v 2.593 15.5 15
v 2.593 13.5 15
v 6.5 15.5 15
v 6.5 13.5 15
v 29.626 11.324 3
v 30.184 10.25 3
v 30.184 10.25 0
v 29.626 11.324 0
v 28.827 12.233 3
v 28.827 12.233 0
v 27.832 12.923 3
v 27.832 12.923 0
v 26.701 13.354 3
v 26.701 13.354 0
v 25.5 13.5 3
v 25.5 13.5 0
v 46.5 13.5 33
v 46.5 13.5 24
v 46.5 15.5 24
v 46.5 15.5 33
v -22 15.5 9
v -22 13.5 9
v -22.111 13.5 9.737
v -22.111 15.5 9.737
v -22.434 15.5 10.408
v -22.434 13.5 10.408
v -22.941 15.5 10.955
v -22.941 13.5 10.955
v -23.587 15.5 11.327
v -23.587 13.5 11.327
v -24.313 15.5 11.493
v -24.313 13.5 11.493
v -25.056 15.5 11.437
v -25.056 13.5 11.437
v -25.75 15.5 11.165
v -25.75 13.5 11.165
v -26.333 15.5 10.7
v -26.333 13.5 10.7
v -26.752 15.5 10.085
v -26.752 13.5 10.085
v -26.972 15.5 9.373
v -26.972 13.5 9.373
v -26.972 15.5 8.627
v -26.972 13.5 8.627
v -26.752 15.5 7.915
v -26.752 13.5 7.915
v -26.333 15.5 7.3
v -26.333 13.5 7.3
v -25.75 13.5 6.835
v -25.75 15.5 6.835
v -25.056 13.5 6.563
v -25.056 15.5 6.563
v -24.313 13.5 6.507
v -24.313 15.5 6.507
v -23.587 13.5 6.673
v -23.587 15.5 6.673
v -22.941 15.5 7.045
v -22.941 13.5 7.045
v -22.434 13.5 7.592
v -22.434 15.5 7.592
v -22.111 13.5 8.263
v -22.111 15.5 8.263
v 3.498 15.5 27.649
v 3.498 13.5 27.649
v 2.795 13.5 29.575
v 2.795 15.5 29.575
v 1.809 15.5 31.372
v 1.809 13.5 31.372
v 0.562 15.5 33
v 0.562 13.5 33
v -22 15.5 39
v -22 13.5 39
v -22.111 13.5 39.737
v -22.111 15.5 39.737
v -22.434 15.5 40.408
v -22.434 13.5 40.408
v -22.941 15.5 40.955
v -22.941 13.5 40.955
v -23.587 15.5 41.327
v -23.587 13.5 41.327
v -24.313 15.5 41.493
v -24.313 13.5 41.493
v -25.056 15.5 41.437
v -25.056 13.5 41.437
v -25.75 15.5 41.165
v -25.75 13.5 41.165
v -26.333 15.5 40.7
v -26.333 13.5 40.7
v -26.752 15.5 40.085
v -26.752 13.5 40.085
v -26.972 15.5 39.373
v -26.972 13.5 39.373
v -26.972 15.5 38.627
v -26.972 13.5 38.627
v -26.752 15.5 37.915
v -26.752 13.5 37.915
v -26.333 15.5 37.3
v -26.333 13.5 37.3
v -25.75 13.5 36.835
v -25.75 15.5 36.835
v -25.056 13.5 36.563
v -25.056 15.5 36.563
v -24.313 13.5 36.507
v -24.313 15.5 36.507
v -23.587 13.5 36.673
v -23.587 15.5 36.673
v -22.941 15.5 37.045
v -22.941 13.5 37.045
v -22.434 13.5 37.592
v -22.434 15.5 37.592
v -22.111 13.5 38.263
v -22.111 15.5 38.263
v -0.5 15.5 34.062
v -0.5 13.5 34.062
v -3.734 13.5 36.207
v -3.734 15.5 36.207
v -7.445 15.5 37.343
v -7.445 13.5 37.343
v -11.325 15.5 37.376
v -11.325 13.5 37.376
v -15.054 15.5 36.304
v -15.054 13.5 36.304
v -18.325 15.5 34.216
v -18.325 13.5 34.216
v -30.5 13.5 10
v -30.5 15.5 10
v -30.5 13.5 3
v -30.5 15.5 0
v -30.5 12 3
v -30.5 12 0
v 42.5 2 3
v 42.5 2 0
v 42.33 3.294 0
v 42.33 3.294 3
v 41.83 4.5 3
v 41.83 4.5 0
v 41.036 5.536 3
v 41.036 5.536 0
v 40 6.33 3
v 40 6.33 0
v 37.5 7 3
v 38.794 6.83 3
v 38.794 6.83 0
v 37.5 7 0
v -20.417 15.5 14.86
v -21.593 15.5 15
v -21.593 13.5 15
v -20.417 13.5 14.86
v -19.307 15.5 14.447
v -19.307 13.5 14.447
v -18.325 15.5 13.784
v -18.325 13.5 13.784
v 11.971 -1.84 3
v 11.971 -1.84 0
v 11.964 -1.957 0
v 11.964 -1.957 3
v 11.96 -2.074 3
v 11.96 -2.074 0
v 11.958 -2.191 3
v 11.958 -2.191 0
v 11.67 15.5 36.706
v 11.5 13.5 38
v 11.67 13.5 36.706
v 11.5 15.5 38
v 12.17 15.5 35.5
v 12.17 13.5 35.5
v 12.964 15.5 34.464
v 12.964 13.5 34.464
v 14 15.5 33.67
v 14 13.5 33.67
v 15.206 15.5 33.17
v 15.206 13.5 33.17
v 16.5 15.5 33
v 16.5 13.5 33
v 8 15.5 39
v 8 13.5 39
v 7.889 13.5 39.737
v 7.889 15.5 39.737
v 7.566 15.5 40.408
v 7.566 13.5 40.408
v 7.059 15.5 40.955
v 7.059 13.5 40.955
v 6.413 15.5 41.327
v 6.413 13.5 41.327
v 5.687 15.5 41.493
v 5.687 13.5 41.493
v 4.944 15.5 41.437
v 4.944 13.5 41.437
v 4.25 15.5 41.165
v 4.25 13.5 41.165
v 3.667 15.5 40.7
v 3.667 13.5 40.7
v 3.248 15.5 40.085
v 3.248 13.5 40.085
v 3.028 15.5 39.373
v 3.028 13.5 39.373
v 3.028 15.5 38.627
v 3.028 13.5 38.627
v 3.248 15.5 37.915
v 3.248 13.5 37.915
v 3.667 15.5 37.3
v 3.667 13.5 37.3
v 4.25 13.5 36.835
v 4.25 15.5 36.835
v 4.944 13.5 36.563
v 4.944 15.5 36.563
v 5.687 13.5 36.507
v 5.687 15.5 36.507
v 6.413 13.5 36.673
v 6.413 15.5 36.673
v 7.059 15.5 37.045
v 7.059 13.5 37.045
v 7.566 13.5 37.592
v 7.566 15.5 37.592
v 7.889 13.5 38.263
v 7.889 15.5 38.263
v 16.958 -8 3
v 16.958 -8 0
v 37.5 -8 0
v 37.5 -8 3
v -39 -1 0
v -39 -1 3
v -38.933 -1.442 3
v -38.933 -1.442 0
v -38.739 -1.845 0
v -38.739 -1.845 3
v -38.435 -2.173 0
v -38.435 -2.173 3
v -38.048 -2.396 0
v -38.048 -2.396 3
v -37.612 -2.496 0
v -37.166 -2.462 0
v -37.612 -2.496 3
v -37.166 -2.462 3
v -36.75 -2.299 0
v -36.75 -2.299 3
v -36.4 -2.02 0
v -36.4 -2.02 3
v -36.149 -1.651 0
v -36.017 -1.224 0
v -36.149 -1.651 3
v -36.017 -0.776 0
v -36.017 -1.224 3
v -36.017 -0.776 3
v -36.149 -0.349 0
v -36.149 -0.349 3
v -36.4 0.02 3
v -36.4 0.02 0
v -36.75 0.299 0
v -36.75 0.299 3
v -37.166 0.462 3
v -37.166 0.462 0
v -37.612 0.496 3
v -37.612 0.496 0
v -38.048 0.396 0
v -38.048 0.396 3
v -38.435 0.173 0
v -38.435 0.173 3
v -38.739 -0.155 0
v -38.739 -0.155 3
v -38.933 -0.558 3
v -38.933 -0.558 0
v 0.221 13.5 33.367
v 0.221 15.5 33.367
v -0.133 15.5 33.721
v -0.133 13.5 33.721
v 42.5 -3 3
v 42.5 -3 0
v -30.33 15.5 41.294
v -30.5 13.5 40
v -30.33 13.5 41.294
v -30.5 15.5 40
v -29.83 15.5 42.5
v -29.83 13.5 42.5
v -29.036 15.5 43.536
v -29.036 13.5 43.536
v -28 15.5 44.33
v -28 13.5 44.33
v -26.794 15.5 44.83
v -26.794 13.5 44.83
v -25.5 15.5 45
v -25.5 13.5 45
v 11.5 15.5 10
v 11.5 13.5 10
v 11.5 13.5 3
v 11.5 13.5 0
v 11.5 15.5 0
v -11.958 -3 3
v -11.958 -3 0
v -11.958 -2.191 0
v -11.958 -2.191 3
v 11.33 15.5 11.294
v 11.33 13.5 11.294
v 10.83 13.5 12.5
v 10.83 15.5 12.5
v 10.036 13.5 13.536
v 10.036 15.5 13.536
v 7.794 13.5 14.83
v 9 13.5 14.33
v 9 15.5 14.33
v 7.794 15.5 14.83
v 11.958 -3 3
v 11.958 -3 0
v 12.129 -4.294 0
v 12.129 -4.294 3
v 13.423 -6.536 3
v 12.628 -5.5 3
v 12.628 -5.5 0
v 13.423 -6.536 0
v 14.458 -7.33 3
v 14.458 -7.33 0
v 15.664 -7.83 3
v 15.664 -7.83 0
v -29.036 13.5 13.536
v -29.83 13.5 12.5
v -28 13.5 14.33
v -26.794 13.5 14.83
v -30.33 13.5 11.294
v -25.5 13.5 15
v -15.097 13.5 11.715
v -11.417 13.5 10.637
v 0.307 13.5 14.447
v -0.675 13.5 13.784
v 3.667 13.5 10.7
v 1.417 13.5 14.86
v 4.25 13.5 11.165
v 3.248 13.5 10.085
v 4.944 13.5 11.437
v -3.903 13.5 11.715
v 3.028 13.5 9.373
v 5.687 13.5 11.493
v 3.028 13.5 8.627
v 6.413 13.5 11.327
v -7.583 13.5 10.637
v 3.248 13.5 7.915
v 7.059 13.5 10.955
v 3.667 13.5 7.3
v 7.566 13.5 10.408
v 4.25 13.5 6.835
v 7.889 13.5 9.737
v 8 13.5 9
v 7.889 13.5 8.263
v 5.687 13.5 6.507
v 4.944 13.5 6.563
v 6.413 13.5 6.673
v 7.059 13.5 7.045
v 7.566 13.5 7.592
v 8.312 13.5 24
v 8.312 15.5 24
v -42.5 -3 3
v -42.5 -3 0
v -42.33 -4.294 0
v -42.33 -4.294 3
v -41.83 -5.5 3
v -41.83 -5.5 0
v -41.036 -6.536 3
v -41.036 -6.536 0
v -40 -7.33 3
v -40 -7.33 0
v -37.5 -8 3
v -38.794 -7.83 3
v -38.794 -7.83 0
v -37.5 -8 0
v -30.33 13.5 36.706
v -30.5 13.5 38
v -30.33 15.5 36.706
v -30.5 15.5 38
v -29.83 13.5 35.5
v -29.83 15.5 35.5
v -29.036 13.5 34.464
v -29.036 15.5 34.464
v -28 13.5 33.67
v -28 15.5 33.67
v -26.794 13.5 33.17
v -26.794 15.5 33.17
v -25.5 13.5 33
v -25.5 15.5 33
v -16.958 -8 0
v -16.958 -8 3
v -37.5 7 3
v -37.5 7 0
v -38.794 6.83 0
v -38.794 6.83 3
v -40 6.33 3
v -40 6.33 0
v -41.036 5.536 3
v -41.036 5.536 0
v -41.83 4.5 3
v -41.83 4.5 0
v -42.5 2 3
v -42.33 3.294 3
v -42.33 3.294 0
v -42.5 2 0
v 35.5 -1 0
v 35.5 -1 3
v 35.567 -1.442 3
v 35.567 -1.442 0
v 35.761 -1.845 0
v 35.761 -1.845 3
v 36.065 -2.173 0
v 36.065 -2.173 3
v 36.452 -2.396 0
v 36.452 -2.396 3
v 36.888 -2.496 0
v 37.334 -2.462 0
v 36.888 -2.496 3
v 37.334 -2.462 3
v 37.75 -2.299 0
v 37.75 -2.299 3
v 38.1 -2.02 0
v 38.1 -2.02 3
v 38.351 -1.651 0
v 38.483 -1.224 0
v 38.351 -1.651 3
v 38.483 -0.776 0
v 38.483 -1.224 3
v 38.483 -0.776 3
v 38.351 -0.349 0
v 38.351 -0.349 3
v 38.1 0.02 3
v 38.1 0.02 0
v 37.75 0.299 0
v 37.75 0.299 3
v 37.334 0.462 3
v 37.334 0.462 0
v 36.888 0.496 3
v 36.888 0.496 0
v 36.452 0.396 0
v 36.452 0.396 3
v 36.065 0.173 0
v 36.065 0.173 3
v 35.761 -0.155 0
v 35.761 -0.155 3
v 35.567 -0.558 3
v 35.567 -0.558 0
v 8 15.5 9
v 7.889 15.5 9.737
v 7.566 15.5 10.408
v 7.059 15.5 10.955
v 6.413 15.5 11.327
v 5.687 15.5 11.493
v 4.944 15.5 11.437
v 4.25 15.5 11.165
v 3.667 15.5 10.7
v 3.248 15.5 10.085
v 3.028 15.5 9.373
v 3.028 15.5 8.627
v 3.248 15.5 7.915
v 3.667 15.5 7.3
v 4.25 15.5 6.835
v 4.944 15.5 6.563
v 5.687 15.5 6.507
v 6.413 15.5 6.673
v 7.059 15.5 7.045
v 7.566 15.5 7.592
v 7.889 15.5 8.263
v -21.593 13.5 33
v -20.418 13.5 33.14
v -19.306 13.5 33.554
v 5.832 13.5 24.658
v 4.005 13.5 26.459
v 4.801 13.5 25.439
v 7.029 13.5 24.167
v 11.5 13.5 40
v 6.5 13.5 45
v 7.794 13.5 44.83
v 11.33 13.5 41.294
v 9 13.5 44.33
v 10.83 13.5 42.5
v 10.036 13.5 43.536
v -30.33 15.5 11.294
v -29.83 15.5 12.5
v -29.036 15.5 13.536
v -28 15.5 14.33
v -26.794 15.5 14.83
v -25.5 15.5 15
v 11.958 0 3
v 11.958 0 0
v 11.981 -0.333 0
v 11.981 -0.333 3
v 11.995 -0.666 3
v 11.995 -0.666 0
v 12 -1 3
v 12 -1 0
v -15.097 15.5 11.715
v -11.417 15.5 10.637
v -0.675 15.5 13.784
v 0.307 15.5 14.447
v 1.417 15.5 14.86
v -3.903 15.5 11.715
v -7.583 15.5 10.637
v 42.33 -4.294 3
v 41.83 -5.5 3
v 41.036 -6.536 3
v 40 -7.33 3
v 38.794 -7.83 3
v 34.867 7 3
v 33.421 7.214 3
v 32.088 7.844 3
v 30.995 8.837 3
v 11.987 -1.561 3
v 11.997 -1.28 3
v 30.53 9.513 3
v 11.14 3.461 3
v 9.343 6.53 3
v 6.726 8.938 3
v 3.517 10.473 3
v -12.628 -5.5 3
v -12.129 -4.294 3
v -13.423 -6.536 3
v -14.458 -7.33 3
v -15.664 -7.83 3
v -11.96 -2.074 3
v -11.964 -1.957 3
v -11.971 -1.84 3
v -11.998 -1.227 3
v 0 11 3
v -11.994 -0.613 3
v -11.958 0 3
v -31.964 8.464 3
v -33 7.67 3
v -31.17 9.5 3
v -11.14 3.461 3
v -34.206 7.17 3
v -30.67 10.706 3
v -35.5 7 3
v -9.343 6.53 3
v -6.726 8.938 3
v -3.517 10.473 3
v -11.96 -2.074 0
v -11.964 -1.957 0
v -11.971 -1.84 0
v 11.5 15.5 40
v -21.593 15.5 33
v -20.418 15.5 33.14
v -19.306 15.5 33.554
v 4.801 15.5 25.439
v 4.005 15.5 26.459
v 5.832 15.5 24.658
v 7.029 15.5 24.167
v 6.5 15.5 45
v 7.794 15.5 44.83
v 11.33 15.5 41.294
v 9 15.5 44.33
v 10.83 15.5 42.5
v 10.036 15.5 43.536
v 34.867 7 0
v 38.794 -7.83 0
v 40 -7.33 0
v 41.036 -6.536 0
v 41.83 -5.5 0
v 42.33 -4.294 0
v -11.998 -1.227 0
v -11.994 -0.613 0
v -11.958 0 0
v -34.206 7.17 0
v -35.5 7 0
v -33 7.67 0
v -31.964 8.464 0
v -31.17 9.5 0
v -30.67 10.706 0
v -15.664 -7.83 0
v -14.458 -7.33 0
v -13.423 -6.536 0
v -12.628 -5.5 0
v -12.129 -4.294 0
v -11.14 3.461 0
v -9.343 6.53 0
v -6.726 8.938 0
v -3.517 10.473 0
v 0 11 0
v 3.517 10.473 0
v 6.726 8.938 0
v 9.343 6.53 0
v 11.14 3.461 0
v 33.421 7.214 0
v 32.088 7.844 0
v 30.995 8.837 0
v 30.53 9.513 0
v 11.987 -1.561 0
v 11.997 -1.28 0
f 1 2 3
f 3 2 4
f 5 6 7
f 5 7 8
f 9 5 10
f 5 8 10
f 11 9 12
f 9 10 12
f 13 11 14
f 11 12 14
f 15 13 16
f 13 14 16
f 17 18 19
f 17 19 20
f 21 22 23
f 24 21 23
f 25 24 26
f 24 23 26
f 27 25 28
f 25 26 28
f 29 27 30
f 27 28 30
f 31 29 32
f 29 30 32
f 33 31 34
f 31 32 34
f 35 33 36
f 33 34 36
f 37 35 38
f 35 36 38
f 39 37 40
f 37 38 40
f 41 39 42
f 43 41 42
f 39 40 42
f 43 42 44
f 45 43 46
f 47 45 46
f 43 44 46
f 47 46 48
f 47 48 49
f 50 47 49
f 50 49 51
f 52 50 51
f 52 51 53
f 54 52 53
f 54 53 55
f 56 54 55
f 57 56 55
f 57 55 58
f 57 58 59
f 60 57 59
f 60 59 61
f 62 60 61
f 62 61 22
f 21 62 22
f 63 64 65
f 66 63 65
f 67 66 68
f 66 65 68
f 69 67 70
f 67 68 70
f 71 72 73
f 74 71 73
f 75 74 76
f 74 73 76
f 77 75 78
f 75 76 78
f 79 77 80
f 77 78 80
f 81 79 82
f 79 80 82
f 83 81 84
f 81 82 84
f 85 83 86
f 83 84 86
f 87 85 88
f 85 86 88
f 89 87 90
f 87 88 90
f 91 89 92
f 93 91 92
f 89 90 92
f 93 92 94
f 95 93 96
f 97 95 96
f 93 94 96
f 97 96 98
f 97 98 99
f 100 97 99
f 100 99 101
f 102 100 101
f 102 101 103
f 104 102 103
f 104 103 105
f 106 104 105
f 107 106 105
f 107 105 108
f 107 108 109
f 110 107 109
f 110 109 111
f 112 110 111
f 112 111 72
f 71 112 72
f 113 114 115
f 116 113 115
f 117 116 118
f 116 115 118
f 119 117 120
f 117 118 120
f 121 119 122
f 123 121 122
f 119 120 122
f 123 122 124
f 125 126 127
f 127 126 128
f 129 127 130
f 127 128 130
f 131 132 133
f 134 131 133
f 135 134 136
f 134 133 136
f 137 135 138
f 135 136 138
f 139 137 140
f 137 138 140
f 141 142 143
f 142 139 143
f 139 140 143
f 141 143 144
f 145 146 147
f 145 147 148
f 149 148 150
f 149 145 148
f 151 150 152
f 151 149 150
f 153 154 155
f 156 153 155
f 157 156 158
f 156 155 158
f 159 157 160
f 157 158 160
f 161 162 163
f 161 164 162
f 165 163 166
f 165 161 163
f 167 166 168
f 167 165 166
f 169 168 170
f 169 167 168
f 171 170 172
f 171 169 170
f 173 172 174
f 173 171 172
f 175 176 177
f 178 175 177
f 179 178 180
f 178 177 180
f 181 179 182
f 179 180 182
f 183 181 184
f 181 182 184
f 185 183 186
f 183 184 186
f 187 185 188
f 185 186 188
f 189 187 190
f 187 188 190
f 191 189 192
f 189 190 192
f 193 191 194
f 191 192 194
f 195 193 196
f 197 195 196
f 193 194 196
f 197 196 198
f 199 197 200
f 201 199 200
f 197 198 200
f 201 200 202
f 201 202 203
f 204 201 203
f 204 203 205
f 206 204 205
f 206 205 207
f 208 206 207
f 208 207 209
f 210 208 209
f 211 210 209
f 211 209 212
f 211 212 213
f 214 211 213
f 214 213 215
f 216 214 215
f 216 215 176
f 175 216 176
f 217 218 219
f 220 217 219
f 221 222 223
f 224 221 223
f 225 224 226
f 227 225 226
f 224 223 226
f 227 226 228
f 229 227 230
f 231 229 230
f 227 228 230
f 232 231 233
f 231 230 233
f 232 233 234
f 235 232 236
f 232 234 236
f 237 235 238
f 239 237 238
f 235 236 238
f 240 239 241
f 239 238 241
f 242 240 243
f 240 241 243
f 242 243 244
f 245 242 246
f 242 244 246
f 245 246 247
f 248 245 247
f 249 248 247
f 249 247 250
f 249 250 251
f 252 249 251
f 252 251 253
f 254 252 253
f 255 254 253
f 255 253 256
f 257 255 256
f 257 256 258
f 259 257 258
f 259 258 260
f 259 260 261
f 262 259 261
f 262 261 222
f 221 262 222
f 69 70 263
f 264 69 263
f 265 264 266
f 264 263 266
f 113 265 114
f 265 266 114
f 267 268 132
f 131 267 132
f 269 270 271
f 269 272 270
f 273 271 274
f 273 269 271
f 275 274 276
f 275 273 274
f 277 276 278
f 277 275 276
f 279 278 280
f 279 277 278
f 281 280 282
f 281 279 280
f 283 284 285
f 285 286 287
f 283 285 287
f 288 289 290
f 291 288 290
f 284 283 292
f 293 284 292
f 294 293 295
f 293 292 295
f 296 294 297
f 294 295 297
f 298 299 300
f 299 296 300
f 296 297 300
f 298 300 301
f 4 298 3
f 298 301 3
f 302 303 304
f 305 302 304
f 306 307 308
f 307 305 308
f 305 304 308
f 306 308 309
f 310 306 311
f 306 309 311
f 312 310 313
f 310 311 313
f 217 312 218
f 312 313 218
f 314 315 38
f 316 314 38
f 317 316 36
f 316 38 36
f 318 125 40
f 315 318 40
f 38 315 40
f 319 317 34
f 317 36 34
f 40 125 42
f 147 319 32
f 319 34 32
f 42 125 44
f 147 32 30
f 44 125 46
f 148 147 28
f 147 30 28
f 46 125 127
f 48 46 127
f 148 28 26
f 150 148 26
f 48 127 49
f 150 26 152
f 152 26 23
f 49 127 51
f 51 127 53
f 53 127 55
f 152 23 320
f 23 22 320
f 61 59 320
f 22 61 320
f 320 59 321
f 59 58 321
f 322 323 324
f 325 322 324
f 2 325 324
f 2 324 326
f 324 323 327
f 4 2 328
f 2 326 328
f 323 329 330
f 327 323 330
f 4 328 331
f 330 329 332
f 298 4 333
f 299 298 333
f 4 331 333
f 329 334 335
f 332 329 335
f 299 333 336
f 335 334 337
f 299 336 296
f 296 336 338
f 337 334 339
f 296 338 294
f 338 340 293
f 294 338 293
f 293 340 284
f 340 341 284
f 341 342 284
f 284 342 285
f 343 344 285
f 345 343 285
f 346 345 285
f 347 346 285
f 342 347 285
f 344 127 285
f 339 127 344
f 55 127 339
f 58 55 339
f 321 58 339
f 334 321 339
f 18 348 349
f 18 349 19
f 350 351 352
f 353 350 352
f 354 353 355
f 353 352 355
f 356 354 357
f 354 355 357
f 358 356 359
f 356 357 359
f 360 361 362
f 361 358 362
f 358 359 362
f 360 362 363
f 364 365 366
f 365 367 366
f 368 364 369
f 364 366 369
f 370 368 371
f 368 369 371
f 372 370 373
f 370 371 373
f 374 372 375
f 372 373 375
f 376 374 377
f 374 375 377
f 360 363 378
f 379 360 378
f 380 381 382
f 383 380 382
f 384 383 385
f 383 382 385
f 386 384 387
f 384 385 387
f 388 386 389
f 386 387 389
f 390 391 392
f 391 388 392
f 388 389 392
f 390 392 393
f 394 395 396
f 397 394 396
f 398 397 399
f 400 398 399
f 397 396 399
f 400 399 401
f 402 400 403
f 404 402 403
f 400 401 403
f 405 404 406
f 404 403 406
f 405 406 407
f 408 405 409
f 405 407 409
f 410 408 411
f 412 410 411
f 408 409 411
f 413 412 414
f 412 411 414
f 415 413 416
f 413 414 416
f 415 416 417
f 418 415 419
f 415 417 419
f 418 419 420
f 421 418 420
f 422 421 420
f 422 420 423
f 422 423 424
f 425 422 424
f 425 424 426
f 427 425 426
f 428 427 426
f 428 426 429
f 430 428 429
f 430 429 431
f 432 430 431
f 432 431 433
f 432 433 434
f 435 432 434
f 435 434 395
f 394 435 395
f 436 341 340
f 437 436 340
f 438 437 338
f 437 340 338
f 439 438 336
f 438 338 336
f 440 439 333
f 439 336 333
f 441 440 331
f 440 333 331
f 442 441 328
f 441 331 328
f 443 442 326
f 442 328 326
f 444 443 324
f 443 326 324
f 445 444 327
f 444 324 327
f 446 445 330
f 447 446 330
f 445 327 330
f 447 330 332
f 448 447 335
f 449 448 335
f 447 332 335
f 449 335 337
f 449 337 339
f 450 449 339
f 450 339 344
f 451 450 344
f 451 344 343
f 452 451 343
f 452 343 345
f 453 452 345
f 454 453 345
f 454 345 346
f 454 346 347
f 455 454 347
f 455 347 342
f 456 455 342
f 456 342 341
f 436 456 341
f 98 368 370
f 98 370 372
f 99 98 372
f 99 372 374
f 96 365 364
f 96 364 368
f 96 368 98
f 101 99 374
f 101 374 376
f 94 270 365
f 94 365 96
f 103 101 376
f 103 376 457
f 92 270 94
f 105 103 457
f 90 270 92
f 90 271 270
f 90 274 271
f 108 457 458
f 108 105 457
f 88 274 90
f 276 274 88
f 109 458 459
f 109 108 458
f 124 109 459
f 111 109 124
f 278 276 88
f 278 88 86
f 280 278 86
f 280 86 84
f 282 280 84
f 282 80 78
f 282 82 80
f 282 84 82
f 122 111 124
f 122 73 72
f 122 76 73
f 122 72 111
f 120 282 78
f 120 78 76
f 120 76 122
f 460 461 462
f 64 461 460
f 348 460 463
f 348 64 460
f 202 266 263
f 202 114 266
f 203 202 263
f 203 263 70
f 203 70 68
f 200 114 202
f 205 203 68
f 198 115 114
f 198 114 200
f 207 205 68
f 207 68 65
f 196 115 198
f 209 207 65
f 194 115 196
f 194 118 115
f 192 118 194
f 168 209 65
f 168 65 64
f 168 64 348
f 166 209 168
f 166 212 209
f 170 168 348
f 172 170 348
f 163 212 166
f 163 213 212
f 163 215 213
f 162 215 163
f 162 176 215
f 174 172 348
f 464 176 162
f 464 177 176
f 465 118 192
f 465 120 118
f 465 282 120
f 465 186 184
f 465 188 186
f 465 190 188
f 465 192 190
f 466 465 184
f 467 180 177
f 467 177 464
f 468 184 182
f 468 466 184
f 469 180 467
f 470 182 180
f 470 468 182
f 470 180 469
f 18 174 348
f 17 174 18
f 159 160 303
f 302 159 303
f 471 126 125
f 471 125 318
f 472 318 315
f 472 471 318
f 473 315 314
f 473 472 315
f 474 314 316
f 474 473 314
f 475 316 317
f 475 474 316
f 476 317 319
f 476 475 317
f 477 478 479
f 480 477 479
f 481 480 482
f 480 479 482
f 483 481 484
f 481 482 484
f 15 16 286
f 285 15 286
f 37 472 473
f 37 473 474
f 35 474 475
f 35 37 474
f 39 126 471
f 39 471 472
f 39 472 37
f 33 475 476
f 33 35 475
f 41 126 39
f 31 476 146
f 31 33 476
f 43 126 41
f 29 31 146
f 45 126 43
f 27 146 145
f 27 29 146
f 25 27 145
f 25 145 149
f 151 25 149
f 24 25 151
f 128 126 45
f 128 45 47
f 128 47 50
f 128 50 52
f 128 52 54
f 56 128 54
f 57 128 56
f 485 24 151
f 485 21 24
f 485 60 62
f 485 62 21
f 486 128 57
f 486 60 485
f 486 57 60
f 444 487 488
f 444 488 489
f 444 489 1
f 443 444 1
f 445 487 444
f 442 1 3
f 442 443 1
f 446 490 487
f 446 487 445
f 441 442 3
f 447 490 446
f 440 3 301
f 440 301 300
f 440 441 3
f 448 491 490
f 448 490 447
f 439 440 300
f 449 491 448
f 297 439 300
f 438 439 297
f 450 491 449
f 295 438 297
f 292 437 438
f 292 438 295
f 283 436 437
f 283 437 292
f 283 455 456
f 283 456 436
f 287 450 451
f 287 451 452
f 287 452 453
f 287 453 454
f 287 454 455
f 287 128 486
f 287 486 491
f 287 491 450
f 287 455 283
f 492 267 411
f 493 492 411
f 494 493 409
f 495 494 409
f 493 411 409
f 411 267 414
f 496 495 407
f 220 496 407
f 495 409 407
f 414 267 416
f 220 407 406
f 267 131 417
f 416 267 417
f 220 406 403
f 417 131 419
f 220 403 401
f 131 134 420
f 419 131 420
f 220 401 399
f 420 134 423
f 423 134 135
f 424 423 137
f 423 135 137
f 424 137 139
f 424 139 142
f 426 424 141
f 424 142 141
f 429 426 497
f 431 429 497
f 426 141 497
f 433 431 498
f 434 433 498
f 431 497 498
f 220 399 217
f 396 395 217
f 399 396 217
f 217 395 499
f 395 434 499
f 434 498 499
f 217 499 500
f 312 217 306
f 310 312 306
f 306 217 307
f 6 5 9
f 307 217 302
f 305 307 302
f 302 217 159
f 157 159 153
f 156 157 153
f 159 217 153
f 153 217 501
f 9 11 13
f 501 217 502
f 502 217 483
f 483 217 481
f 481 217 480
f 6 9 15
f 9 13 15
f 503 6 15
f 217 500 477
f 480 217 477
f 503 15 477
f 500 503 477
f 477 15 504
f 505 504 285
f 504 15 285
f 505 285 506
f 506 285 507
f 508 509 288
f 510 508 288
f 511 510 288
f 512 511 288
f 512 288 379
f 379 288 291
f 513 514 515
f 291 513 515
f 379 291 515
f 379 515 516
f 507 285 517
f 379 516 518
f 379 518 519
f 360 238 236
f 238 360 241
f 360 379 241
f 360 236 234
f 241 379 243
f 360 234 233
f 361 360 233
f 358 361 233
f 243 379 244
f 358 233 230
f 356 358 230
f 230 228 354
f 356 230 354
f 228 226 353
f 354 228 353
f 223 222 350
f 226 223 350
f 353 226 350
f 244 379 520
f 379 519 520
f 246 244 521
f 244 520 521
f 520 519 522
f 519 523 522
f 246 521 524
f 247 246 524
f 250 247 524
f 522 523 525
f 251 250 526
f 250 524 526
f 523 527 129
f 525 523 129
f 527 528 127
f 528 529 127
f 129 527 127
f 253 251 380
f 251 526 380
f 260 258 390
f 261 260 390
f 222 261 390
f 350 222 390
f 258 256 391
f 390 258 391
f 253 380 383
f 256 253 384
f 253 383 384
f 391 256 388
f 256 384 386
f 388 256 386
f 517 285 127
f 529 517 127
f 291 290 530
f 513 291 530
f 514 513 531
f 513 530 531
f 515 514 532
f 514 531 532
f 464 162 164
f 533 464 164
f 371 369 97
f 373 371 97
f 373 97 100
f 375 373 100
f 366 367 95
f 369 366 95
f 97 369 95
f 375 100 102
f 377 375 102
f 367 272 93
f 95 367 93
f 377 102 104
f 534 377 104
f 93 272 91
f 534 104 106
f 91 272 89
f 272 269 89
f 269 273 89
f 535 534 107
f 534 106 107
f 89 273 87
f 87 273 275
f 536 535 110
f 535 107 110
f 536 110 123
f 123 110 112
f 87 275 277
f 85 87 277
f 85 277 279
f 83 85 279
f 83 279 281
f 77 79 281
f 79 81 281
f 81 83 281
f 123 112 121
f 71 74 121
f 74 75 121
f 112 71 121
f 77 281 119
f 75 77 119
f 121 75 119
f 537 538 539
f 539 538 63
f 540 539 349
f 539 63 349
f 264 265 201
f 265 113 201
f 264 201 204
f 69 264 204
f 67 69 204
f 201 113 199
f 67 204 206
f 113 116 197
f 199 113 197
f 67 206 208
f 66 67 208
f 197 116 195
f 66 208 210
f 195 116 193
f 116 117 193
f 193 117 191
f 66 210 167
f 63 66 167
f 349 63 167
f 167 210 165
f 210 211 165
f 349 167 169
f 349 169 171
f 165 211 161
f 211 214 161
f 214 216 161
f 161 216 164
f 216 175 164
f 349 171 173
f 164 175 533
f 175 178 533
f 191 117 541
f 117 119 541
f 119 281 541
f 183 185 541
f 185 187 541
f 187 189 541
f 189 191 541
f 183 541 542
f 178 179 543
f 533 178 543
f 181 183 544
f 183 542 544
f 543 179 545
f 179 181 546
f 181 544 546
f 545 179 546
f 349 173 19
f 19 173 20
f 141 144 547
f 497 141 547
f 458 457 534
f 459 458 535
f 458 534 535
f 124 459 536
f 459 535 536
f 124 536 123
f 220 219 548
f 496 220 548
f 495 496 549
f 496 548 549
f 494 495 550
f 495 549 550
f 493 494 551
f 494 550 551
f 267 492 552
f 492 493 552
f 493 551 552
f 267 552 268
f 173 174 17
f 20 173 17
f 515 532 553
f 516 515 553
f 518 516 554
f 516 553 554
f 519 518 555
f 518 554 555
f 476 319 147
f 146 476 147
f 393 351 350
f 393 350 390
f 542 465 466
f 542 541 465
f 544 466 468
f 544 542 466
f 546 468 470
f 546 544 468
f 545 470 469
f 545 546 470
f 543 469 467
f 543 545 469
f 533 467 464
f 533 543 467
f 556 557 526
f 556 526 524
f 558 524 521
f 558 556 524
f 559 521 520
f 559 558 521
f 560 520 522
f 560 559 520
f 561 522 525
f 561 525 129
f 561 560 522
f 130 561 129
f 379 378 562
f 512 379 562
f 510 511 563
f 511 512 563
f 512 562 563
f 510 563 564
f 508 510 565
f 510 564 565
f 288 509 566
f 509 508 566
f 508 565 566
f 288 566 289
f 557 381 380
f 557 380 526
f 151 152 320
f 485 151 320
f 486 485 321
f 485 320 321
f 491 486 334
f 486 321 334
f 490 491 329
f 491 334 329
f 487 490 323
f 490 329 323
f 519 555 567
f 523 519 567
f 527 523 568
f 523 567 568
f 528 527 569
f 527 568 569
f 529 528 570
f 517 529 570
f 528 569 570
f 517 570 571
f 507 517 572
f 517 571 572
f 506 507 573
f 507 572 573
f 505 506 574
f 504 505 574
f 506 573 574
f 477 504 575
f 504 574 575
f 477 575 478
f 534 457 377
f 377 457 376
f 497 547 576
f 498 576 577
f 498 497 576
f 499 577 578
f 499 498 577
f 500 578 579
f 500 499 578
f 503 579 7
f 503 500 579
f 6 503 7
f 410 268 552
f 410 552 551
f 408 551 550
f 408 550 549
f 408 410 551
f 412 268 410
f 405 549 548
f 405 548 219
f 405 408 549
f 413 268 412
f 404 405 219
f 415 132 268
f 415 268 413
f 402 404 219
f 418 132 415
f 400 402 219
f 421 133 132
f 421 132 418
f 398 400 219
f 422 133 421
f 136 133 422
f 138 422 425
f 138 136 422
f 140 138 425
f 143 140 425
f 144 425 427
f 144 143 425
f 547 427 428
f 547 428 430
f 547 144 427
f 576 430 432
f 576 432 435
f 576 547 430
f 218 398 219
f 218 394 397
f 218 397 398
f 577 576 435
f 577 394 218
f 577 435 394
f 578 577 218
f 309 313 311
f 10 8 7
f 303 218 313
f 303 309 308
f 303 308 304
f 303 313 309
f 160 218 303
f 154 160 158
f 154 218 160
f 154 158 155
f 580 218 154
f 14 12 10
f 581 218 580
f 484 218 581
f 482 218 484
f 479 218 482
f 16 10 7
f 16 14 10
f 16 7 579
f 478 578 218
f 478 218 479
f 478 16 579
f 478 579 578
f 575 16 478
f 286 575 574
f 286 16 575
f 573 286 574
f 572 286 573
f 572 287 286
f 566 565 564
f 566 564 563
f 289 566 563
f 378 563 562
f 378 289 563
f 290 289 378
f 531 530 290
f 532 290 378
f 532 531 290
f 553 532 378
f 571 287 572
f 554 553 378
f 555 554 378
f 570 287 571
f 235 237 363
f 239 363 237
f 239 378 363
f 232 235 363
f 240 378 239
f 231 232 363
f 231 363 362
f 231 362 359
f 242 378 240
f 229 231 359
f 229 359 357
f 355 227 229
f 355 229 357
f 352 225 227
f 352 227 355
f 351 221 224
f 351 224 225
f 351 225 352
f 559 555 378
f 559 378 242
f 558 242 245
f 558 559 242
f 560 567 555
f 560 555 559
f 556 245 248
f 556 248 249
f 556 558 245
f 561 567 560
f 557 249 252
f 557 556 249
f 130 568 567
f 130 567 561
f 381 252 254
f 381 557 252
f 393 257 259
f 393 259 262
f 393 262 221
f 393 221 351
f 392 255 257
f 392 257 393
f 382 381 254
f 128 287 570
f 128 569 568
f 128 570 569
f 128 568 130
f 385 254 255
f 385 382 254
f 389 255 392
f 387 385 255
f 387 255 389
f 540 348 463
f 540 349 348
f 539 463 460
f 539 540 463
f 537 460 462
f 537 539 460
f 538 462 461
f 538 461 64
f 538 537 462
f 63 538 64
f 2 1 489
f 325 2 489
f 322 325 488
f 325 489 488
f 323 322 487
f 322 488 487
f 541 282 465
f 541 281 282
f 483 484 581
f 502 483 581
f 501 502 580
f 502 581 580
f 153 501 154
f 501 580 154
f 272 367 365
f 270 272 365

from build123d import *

# Parameters (mm, degrees)
F0_W        = 12
F0_H        = 15
F0_W_2      = 42
F0_H_2      = 2
F0_W_3      = 17
F0_H_3      = 6.5
F1_DEPTH    = 3
F2_D        = 3
F2_DEPTH    = 10
F2_TIP      = 0.9012909285
F3_DEPTH    = 45
F4_R        = 2.5
F5_DEPTH    = 25
F6_T1_DEPTH = 3
F6_T3_DEPTH = 28
F6_T5_DEPTH = 27
F6_T7_DEPTH = 12.1554036185
F6_T9_DEPTH = 3.9527148617
F6_S1_F1_R  = 5
F6_S1_F2_R  = 5
F6_S1_F3_R  = 5
F6_S1_F4_R  = 5
F6_S1_F5_R  = 5
F7_R        = 5
F4_W        = 35
F4_H        = 9
F8_DEPTH    = 2
F9_R        = 5


# Not quite as in the source:
# - a fillet or chamfer that OpenCascade refuses, or shapes differently, is made with other operations: its cross-section is extruded or revolved along the edge and cut away or added


with BuildPart() as f1:
    # F0 (on Top) → F1 (new body)
    with BuildSketch(Plane.XY):
        with Locations((-36.5, -0.5)):
            Rectangle(F0_W, F0_H)
        with Locations((36.5, -0.5)):
            Rectangle(F0_W, F0_H)
        with Locations((-9.5, 14.5)):
            Rectangle(F0_W_2, F0_H_2)
        with BuildLine():
            Line((-30.5, 13.5), (-30.5, 7))
            Line((-30.5, 7), (-30.5, -8))
            Line((-30.5, -8), (-11.9582607431, -8))
            Line((-11.9582607431, -8), (-11.9582607431, -2))
            ThreePointArc((-11.9582607431, -2), (-12, -1), (-11.9582607431, 0))
            ThreePointArc((-11.9582607431, 0), (0, 11), (11.9582607431, 0))
            ThreePointArc((11.9582607431, 0), (11.9895606449, -0.4995646481), (12, -1))
            ThreePointArc((12, -1), (11.9895606449, -1.5004353519), (11.9582607431, -2))
            Line((11.9582607431, -2), (11.9582607431, -8))
            Line((11.9582607431, -8), (30.5, -8))
            Line((30.5, -8), (30.5, 7))
            Line((30.5, 7), (13.5, 7))
            Line((13.5, 7), (13.5, 13.5))
            Line((13.5, 13.5), (11.5, 13.5))
            Line((11.5, 13.5), (-30.5, 13.5))
        make_face()
        with Locations((22, 10.25)):
            Rectangle(F0_W_3, F0_H_3)
    extrude(amount=F1_DEPTH)

    # F2
    with Locations(Plane(origin=(0, 0, 0), x_dir=(1, 0, 0), z_dir=(0, 0, -1))):
        with Locations((-37.5, 1), (37, 1)):
            Hole(F2_D / 2, depth=F2_DEPTH)
            with Locations((0, 0, -(F2_DEPTH + F2_TIP / 2))):  # 118° drill point
                Cone(0, F2_D / 2, F2_TIP, mode=Mode.SUBTRACT)

    # F0 (on Top) → F3 (join)
    with BuildSketch(Plane.XY):
        with Locations((-9.5, 14.5)):
            Rectangle(F0_W_2, F0_H_2)
    extrude(amount=F3_DEPTH)

    # F4 (on face) → F5 (cut)
    with BuildSketch(Plane.XZ.offset(-13.5)):
        with Locations((-24.5, 39)):
            Circle(F4_R)
        with Locations((5.5, 39)):
            Circle(F4_R)
        with Locations((-24.5, 9)):
            Circle(F4_R)
        with Locations((5.5, 9)):
            Circle(F4_R)
        with BuildLine():
            ThreePointArc((0.5623058987, 15), (3.111326846, 19.1829017881), (4, 24))
            ThreePointArc((4, 24), (3.111326846, 28.8170982119), (0.5623058987, 33))
            ThreePointArc((0.5623058987, 33), (0.045941546, 33.545941546), (-0.5, 34.0623058987))
            ThreePointArc((-0.5, 34.0623058987), (-9.5, 37.5), (-18.5, 34.0623058987))
            ThreePointArc((-18.5, 34.0623058987), (-19.045941546, 33.545941546), (-19.5623058987, 33))
            ThreePointArc((-19.5623058987, 33), (-22.111326846, 28.8170982119), (-23, 24))
            ThreePointArc((-23, 24), (-22.111326846, 19.1829017881), (-19.5623058987, 15))
            ThreePointArc((-19.5623058987, 15), (-9.5, 10.5), (0.5623058987, 15))
        make_face()
        with BuildLine():
            Line((-30.5, 15), (-19.5623058987, 15))
            ThreePointArc((-19.5623058987, 15), (-22.111326846, 19.1829017881), (-23, 24))
            Line((-23, 24), (-30.5, 24))
            Line((-30.5, 24), (-30.5, 15))
        make_face()
        with BuildLine():
            Line((11.5, 24), (4, 24))
            ThreePointArc((4, 24), (3.111326846, 19.1829017881), (0.5623058987, 15))
            Line((0.5623058987, 15), (11.5, 15))
            Line((11.5, 15), (11.5, 24))
        make_face()
        with BuildLine():
            Line((-30.5, 24), (-23, 24))
            ThreePointArc((-23, 24), (-22.111326846, 28.8170982119), (-19.5623058987, 33))
            Line((-19.5623058987, 33), (-30.5, 33))
            Line((-30.5, 33), (-30.5, 24))
        make_face()
    extrude(amount=-F5_DEPTH, mode=Mode.SUBTRACT)

    # F6: fillet of radius 5 on 14 edges, made by hand

    # F6_s2 → F6_t1 (join)
    with BuildSketch(Plane.XY):
        with BuildLine():
            ThreePointArc((-35.5, 7), (-31.9644660941, 8.4644660941), (-30.5, 12))
            Line((-30.5, 12), (-30.5, 7))
            Line((-30.5, 7), (-35.5, 7))
        make_face()
    extrude(amount=F6_T1_DEPTH)

    # F6_s4 → F6_t3 (cut)
    with BuildSketch(Plane.XY.offset(-12.5)):
        with BuildLine():
            ThreePointArc((-42.5, -3), (-41.0355339059, -6.5355339059), (-37.5, -8))
            Line((-37.5, -8), (-42.5, -8))
            Line((-42.5, -8), (-42.5, -3))
        make_face()
        with BuildLine():
            ThreePointArc((-37.5, 7), (-41.0355339059, 5.5355339059), (-42.5, 2))
            Line((-42.5, 2), (-42.5, 7))
            Line((-42.5, 7), (-37.5, 7))
        make_face()
        with BuildLine():
            ThreePointArc((42.5, 2), (41.0355339059, 5.5355339059), (37.5, 7))
            Line((37.5, 7), (42.5, 7))
            Line((42.5, 7), (42.5, 2))
        make_face()
        with BuildLine():
            ThreePointArc((37.5, -8), (41.0355339059, -6.5355339059), (42.5, -3))
            Line((42.5, -3), (42.5, -8))
            Line((42.5, -8), (37.5, -8))
        make_face()
        with BuildLine():
            ThreePointArc((30.5, 8.5), (29.0355339059, 12.0355339059), (25.5, 13.5))
            Line((25.5, 13.5), (30.5, 13.5))
            Line((30.5, 13.5), (30.5, 8.5))
        make_face()
        with BuildLine():
            ThreePointArc((-16.9582607431, -8), (-13.4227268372, -6.5355339059), (-11.9582607431, -3))
            Line((-11.9582607431, -3), (-11.9582607431, -8))
            Line((-11.9582607431, -8), (-16.9582607431, -8))
        make_face()
        with BuildLine():
            ThreePointArc((11.9582607431, -3), (13.4227268372, -6.5355339059), (16.9582607431, -8))
            Line((16.9582607431, -8), (11.9582607431, -8))
            Line((11.9582607431, -8), (11.9582607431, -3))
        make_face()
    extrude(amount=F6_T3_DEPTH, mode=Mode.SUBTRACT)

    # F6_s6 → F6_t5 (cut)
    with BuildSketch(Plane.XZ.offset(-28)):
        with BuildLine():
            ThreePointArc((-30.5, 10), (-29.0355339059, 13.5355339059), (-25.5, 15))
            Line((-25.5, 15), (-30.5, 15))
            Line((-30.5, 15), (-30.5, 10))
        make_face()
        with BuildLine():
            ThreePointArc((11.5, 10), (10.0355339059, 13.5355339059), (6.5, 15))
            Line((6.5, 15), (11.5, 15))
            Line((11.5, 15), (11.5, 10))
        make_face()
    extrude(amount=F6_T5_DEPTH, mode=Mode.SUBTRACT)

    # F6_s8 → F6_t7 (cut)
    with BuildSketch(Plane.XZ.offset(-20.5777018093)):
        with BuildLine():
            ThreePointArc((-21.5933866224, 15), (-19.8496720413, 14.6860921309), (-18.3249037515, 13.7837837838))
            ThreePointArc((-18.3249037515, 13.7837837838), (-18.9631637186, 14.3719922915), (-19.5623058987, 15))
            Line((-19.5623058987, 15), (-21.5933866224, 15))
        make_face()
        with BuildLine():
            ThreePointArc((2.5933866224, 15), (0.8496720413, 14.6860921309), (-0.6750962485, 13.7837837838))
            ThreePointArc((-0.6750962485, 13.7837837838), (-0.0368362814, 14.3719922915), (0.5623058987, 15))
            Line((0.5623058987, 15), (2.5933866224, 15))
        make_face()
    extrude(amount=F6_T7_DEPTH, mode=Mode.SUBTRACT)

    # F6_s10 → F6_t9 (cut)
    with BuildSketch(Plane.XY.offset(-0.4763574308)):
        with BuildLine():
            ThreePointArc((-11.9582607431, -2.1905429723), (-11.9613307486, -2.0153555582), (-11.9705369951, -1.8403832746))
            ThreePointArc((-11.9705369951, -1.8403832746), (-11.9646650465, -1.9202121092), (-11.9582607431, -2))
            Line((-11.9582607431, -2), (-11.9582607431, -2.1905429723))
        make_face()
        with BuildLine():
            ThreePointArc((11.9705369951, -1.8403832746), (11.9613307486, -2.0153555582), (11.9582607431, -2.1905429723))
            Line((11.9582607431, -2.1905429723), (11.9582607431, -2))
            ThreePointArc((11.9582607431, -2), (11.9646650465, -1.9202121092), (11.9705369951, -1.8403832746))
        make_face()
    extrude(amount=F6_T9_DEPTH, mode=Mode.SUBTRACT)

    # F6#s1: fillet of radius 5 on 5 edges, made by hand

    # F6_s1_f1
    f6_s1_f1_edges = [f1.edges().sort_by_distance(p)[0] for p in [
        (-30.5, 14.5, 33),
    ]]
    fillet(f6_s1_f1_edges, radius=F6_S1_F1_R)

    # F6_s1_f2
    f6_s1_f2_edges = [f1.edges().sort_by_distance(p)[0] for p in [
        (-30.5, 14.5, 45),
    ]]
    fillet(f6_s1_f2_edges, radius=F6_S1_F2_R)

    # F6_s1_f3
    f6_s1_f3_edges = [f1.edges().sort_by_distance(p)[0] for p in [
        (-19.5623058987, 14.5, 33),
    ]]
    fillet(f6_s1_f3_edges, radius=F6_S1_F3_R)

    # F6_s1_f4
    f6_s1_f4_edges = [f1.edges().sort_by_distance(p)[0] for p in [
        (11.5, 14.5, 45),
    ]]
    fillet(f6_s1_f4_edges, radius=F6_S1_F4_R)

    # F6_s1_f5
    f6_s1_f5_edges = [f1.edges().sort_by_distance(p)[0] for p in [
        (4, 14.5, 24),
    ]]
    fillet(f6_s1_f5_edges, radius=F6_S1_F5_R)

    # F7
    f7_edges = [f1.edges().sort_by_distance(p)[0] for p in [
        (30.5, 7, 1.5),
    ]]
    fillet(f7_edges, radius=F7_R)

    # F4 (on face) → F8 (join)
    with BuildSketch(Plane.XZ.offset(-13.5)):
        with Locations((29, 28.5)):
            Rectangle(F4_W, F4_H)
    extrude(amount=-F8_DEPTH)

    # F9
    f9_edges = [f1.edges().sort_by_distance(p)[0] for p in [
        (11.5, 14.5, 33),
    ]]
    fillet(f9_edges, radius=F9_R)


solid = f1.part
